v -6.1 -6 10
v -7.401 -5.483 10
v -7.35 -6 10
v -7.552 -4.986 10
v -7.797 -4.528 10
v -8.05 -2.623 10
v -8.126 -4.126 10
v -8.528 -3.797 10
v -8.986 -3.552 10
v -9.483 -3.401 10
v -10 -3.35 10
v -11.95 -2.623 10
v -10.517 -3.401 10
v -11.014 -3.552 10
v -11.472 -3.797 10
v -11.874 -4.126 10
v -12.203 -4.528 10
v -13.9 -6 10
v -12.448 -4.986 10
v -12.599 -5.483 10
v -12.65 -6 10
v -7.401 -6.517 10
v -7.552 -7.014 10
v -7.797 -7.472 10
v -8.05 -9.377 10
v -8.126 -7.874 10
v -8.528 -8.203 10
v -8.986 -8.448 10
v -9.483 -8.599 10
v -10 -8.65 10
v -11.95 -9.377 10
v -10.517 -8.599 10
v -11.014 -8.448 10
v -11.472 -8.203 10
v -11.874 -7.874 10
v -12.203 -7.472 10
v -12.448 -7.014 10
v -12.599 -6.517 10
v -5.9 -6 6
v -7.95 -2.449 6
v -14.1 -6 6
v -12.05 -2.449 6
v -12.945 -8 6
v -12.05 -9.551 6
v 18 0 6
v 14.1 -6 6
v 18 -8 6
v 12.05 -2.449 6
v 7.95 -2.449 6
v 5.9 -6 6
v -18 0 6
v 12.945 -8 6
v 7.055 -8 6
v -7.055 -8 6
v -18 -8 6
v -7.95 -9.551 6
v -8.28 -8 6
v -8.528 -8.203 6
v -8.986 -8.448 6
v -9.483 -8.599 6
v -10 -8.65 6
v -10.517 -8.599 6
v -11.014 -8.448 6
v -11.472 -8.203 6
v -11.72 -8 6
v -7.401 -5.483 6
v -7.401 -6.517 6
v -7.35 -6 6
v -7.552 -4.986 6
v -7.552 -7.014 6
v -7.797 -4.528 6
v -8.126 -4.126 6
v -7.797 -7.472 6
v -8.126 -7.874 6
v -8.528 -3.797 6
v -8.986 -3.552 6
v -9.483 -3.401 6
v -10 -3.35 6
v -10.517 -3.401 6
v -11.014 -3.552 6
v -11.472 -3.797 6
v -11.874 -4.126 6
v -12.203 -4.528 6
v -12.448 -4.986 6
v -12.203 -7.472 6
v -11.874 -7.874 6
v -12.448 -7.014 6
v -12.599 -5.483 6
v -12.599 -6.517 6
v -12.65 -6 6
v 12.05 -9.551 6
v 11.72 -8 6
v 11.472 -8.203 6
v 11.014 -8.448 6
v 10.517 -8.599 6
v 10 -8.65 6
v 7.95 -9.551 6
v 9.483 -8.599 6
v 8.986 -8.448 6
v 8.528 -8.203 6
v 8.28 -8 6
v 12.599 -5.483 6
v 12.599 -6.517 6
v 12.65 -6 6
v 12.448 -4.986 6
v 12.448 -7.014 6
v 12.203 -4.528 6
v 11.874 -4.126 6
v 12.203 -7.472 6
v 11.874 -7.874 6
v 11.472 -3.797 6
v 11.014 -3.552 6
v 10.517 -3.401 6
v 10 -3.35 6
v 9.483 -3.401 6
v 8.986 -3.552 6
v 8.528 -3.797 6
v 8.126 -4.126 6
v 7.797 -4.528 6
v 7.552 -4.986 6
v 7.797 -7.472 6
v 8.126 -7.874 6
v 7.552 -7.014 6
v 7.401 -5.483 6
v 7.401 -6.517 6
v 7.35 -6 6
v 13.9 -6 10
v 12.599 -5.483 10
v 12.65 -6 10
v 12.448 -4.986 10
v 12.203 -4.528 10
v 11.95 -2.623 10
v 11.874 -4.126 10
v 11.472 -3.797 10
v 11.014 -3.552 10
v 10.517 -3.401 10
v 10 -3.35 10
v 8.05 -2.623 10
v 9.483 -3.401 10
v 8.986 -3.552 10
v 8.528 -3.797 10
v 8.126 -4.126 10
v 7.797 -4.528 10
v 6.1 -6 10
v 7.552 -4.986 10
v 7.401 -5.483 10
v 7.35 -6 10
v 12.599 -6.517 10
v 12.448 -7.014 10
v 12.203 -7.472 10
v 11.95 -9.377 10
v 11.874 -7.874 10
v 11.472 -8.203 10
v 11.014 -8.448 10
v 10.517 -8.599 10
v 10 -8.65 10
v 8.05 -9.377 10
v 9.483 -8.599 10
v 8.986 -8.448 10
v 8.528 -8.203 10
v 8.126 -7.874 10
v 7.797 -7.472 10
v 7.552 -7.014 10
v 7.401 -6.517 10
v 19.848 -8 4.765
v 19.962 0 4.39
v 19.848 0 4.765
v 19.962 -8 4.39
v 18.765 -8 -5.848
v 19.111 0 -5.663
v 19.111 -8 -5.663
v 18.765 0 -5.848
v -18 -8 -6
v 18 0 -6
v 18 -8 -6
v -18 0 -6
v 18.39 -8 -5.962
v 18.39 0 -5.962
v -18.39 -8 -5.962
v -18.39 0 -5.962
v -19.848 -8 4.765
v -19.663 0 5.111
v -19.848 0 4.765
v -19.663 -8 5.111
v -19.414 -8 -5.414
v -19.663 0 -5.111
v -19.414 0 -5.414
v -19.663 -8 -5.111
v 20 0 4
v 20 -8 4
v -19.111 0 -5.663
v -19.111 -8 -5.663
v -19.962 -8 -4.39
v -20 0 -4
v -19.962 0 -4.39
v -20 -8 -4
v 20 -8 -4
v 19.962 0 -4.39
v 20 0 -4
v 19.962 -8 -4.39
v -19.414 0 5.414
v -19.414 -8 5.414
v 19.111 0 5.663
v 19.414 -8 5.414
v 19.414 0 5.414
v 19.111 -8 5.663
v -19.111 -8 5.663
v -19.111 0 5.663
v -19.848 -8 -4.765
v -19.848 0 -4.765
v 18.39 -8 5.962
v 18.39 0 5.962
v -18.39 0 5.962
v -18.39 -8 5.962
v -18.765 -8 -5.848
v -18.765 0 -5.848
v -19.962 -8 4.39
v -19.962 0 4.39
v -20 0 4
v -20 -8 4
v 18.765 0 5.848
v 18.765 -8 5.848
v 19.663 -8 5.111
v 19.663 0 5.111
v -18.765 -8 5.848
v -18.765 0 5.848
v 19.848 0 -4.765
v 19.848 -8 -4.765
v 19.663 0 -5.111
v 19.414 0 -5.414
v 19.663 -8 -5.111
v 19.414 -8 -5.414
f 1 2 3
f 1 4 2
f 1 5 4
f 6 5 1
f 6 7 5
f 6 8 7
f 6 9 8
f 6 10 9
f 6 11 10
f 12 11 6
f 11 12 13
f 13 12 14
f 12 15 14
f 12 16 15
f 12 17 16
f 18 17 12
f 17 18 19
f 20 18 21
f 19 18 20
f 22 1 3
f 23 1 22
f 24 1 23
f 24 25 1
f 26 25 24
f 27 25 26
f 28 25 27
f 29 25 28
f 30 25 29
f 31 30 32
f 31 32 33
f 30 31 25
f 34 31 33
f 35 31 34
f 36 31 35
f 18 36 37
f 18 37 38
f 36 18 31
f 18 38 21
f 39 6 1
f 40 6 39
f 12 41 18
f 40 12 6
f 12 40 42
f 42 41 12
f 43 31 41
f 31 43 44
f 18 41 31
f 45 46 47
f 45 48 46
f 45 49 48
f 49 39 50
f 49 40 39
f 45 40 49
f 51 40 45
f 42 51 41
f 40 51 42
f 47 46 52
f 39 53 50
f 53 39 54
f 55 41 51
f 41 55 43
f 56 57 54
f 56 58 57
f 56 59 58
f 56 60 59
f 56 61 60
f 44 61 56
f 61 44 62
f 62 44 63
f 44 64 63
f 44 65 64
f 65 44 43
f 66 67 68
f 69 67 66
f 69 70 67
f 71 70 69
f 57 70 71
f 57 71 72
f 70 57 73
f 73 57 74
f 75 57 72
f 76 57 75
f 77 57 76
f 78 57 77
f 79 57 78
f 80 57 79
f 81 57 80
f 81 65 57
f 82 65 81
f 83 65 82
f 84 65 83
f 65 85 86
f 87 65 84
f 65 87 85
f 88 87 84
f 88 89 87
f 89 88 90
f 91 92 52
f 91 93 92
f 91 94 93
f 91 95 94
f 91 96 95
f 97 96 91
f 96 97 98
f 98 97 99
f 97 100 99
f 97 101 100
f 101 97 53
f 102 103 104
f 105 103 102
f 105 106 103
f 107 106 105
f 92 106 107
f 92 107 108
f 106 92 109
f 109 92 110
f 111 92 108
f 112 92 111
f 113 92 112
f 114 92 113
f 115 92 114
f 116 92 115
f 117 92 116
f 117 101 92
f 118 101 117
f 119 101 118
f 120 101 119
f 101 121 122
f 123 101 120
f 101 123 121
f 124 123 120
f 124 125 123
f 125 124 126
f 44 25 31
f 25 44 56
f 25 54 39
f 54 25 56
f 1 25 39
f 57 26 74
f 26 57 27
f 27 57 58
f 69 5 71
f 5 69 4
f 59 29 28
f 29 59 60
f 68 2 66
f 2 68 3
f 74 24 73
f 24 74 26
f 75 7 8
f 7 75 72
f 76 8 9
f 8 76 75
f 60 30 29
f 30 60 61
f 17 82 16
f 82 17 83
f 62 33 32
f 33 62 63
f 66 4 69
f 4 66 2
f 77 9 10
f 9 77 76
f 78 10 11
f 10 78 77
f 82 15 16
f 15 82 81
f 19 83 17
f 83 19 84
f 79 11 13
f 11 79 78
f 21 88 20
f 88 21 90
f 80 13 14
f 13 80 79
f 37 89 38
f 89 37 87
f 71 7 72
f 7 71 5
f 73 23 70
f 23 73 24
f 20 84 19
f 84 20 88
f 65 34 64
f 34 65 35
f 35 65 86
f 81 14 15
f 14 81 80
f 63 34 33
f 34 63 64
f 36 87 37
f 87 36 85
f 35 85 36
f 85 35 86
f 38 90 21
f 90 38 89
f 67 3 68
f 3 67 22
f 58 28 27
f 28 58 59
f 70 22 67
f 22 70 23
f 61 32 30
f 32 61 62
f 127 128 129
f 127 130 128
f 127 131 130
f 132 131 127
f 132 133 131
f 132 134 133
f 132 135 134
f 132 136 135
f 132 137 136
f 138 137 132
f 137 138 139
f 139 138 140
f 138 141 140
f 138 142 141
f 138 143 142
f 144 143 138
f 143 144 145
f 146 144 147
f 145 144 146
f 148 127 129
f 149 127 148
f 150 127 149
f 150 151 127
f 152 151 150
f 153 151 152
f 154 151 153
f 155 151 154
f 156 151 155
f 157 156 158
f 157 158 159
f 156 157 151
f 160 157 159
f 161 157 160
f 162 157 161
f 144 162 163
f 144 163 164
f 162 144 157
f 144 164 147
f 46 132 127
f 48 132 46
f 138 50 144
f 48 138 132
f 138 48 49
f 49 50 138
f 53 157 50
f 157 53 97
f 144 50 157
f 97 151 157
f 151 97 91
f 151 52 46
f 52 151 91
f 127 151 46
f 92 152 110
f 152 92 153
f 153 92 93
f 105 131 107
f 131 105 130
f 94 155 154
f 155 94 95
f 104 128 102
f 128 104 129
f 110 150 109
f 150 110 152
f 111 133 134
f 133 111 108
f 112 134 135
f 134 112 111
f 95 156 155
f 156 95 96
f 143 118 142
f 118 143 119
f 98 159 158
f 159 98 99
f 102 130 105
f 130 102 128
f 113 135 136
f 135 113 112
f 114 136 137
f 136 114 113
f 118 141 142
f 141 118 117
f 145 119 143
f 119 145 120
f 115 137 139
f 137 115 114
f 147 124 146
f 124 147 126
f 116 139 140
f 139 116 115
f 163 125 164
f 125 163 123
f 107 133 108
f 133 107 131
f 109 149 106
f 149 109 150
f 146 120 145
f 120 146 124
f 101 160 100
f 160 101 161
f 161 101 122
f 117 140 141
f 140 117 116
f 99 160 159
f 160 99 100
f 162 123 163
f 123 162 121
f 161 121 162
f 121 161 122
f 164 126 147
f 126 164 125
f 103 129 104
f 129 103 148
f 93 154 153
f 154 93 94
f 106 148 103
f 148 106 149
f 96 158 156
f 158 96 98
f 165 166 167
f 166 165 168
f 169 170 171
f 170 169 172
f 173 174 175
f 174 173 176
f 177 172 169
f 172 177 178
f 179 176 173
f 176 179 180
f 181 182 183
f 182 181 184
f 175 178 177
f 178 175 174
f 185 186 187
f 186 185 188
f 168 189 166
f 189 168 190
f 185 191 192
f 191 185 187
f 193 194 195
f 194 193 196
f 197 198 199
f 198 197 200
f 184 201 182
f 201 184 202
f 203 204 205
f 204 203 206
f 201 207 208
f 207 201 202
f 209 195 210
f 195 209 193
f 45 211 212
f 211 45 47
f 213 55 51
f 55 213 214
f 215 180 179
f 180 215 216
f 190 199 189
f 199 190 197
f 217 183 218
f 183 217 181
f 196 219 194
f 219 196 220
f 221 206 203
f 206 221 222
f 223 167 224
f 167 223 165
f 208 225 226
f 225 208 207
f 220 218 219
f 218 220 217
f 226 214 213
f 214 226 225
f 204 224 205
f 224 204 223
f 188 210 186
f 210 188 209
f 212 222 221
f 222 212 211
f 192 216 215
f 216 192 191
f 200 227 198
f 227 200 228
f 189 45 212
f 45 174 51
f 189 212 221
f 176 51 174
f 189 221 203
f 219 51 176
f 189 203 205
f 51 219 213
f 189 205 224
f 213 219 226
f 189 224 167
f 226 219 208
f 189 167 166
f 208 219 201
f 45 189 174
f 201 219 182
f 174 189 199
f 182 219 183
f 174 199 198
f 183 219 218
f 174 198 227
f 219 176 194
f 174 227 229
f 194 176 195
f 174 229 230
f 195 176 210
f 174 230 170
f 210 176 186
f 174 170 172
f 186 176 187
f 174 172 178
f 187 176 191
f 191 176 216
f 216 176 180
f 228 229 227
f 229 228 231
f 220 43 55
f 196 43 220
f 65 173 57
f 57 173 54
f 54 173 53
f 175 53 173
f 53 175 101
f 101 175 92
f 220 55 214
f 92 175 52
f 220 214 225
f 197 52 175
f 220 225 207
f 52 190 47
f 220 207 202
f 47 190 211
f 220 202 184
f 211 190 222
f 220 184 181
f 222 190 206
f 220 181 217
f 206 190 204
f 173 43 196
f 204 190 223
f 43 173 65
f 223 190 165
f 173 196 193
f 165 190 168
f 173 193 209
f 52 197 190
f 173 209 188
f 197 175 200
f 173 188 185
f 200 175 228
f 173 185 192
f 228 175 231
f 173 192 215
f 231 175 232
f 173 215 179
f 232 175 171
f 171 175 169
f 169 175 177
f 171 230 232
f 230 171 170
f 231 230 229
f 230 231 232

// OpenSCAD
include <rm_common.scad>

PART="male"; // male or female
assert(PART=="male" || PART=="female", "Unknown edge coupon");

// Coupons simulate 1U panel edges. Male edges are flush with the panel
// profile. A female edge carries a rib so its horizontal hexagonal ports
// keep real walls inside RM_EDGE_T. Both print lying on a long side face,
// features upward, support-free, and mate with each other.

module edge_male() {
  translate([-20,-6,0]) rounded_box([40,12,RM_PANEL_T],2);
  for(x=edge_anchors(RM_UNIT))
    translate([x,6,RM_EDGE_T/2])
      rotate([-90,0,0]) mount_peg(h=RM_EDGE_PEG_L);
}

module edge_female() {
  difference() {
    union() {
      translate([-20,-6,0]) rounded_box([40,12,RM_PANEL_T],2);
      translate([-20,-6,RM_PANEL_T])
        rounded_box([40,12,RM_EDGE_T-RM_PANEL_T],2);
    }
    for(x=edge_anchors(RM_UNIT))
      translate([x,-6,RM_EDGE_T/2])
        rotate([-90,0,0]) edge_port_cut();
  }
}

// Resting on a side face turns the horizontal peg/port axes upright.
if(PART=="male") rotate([90,0,0]) edge_male();
if(PART=="female") rotate([90,0,0]) edge_female();
